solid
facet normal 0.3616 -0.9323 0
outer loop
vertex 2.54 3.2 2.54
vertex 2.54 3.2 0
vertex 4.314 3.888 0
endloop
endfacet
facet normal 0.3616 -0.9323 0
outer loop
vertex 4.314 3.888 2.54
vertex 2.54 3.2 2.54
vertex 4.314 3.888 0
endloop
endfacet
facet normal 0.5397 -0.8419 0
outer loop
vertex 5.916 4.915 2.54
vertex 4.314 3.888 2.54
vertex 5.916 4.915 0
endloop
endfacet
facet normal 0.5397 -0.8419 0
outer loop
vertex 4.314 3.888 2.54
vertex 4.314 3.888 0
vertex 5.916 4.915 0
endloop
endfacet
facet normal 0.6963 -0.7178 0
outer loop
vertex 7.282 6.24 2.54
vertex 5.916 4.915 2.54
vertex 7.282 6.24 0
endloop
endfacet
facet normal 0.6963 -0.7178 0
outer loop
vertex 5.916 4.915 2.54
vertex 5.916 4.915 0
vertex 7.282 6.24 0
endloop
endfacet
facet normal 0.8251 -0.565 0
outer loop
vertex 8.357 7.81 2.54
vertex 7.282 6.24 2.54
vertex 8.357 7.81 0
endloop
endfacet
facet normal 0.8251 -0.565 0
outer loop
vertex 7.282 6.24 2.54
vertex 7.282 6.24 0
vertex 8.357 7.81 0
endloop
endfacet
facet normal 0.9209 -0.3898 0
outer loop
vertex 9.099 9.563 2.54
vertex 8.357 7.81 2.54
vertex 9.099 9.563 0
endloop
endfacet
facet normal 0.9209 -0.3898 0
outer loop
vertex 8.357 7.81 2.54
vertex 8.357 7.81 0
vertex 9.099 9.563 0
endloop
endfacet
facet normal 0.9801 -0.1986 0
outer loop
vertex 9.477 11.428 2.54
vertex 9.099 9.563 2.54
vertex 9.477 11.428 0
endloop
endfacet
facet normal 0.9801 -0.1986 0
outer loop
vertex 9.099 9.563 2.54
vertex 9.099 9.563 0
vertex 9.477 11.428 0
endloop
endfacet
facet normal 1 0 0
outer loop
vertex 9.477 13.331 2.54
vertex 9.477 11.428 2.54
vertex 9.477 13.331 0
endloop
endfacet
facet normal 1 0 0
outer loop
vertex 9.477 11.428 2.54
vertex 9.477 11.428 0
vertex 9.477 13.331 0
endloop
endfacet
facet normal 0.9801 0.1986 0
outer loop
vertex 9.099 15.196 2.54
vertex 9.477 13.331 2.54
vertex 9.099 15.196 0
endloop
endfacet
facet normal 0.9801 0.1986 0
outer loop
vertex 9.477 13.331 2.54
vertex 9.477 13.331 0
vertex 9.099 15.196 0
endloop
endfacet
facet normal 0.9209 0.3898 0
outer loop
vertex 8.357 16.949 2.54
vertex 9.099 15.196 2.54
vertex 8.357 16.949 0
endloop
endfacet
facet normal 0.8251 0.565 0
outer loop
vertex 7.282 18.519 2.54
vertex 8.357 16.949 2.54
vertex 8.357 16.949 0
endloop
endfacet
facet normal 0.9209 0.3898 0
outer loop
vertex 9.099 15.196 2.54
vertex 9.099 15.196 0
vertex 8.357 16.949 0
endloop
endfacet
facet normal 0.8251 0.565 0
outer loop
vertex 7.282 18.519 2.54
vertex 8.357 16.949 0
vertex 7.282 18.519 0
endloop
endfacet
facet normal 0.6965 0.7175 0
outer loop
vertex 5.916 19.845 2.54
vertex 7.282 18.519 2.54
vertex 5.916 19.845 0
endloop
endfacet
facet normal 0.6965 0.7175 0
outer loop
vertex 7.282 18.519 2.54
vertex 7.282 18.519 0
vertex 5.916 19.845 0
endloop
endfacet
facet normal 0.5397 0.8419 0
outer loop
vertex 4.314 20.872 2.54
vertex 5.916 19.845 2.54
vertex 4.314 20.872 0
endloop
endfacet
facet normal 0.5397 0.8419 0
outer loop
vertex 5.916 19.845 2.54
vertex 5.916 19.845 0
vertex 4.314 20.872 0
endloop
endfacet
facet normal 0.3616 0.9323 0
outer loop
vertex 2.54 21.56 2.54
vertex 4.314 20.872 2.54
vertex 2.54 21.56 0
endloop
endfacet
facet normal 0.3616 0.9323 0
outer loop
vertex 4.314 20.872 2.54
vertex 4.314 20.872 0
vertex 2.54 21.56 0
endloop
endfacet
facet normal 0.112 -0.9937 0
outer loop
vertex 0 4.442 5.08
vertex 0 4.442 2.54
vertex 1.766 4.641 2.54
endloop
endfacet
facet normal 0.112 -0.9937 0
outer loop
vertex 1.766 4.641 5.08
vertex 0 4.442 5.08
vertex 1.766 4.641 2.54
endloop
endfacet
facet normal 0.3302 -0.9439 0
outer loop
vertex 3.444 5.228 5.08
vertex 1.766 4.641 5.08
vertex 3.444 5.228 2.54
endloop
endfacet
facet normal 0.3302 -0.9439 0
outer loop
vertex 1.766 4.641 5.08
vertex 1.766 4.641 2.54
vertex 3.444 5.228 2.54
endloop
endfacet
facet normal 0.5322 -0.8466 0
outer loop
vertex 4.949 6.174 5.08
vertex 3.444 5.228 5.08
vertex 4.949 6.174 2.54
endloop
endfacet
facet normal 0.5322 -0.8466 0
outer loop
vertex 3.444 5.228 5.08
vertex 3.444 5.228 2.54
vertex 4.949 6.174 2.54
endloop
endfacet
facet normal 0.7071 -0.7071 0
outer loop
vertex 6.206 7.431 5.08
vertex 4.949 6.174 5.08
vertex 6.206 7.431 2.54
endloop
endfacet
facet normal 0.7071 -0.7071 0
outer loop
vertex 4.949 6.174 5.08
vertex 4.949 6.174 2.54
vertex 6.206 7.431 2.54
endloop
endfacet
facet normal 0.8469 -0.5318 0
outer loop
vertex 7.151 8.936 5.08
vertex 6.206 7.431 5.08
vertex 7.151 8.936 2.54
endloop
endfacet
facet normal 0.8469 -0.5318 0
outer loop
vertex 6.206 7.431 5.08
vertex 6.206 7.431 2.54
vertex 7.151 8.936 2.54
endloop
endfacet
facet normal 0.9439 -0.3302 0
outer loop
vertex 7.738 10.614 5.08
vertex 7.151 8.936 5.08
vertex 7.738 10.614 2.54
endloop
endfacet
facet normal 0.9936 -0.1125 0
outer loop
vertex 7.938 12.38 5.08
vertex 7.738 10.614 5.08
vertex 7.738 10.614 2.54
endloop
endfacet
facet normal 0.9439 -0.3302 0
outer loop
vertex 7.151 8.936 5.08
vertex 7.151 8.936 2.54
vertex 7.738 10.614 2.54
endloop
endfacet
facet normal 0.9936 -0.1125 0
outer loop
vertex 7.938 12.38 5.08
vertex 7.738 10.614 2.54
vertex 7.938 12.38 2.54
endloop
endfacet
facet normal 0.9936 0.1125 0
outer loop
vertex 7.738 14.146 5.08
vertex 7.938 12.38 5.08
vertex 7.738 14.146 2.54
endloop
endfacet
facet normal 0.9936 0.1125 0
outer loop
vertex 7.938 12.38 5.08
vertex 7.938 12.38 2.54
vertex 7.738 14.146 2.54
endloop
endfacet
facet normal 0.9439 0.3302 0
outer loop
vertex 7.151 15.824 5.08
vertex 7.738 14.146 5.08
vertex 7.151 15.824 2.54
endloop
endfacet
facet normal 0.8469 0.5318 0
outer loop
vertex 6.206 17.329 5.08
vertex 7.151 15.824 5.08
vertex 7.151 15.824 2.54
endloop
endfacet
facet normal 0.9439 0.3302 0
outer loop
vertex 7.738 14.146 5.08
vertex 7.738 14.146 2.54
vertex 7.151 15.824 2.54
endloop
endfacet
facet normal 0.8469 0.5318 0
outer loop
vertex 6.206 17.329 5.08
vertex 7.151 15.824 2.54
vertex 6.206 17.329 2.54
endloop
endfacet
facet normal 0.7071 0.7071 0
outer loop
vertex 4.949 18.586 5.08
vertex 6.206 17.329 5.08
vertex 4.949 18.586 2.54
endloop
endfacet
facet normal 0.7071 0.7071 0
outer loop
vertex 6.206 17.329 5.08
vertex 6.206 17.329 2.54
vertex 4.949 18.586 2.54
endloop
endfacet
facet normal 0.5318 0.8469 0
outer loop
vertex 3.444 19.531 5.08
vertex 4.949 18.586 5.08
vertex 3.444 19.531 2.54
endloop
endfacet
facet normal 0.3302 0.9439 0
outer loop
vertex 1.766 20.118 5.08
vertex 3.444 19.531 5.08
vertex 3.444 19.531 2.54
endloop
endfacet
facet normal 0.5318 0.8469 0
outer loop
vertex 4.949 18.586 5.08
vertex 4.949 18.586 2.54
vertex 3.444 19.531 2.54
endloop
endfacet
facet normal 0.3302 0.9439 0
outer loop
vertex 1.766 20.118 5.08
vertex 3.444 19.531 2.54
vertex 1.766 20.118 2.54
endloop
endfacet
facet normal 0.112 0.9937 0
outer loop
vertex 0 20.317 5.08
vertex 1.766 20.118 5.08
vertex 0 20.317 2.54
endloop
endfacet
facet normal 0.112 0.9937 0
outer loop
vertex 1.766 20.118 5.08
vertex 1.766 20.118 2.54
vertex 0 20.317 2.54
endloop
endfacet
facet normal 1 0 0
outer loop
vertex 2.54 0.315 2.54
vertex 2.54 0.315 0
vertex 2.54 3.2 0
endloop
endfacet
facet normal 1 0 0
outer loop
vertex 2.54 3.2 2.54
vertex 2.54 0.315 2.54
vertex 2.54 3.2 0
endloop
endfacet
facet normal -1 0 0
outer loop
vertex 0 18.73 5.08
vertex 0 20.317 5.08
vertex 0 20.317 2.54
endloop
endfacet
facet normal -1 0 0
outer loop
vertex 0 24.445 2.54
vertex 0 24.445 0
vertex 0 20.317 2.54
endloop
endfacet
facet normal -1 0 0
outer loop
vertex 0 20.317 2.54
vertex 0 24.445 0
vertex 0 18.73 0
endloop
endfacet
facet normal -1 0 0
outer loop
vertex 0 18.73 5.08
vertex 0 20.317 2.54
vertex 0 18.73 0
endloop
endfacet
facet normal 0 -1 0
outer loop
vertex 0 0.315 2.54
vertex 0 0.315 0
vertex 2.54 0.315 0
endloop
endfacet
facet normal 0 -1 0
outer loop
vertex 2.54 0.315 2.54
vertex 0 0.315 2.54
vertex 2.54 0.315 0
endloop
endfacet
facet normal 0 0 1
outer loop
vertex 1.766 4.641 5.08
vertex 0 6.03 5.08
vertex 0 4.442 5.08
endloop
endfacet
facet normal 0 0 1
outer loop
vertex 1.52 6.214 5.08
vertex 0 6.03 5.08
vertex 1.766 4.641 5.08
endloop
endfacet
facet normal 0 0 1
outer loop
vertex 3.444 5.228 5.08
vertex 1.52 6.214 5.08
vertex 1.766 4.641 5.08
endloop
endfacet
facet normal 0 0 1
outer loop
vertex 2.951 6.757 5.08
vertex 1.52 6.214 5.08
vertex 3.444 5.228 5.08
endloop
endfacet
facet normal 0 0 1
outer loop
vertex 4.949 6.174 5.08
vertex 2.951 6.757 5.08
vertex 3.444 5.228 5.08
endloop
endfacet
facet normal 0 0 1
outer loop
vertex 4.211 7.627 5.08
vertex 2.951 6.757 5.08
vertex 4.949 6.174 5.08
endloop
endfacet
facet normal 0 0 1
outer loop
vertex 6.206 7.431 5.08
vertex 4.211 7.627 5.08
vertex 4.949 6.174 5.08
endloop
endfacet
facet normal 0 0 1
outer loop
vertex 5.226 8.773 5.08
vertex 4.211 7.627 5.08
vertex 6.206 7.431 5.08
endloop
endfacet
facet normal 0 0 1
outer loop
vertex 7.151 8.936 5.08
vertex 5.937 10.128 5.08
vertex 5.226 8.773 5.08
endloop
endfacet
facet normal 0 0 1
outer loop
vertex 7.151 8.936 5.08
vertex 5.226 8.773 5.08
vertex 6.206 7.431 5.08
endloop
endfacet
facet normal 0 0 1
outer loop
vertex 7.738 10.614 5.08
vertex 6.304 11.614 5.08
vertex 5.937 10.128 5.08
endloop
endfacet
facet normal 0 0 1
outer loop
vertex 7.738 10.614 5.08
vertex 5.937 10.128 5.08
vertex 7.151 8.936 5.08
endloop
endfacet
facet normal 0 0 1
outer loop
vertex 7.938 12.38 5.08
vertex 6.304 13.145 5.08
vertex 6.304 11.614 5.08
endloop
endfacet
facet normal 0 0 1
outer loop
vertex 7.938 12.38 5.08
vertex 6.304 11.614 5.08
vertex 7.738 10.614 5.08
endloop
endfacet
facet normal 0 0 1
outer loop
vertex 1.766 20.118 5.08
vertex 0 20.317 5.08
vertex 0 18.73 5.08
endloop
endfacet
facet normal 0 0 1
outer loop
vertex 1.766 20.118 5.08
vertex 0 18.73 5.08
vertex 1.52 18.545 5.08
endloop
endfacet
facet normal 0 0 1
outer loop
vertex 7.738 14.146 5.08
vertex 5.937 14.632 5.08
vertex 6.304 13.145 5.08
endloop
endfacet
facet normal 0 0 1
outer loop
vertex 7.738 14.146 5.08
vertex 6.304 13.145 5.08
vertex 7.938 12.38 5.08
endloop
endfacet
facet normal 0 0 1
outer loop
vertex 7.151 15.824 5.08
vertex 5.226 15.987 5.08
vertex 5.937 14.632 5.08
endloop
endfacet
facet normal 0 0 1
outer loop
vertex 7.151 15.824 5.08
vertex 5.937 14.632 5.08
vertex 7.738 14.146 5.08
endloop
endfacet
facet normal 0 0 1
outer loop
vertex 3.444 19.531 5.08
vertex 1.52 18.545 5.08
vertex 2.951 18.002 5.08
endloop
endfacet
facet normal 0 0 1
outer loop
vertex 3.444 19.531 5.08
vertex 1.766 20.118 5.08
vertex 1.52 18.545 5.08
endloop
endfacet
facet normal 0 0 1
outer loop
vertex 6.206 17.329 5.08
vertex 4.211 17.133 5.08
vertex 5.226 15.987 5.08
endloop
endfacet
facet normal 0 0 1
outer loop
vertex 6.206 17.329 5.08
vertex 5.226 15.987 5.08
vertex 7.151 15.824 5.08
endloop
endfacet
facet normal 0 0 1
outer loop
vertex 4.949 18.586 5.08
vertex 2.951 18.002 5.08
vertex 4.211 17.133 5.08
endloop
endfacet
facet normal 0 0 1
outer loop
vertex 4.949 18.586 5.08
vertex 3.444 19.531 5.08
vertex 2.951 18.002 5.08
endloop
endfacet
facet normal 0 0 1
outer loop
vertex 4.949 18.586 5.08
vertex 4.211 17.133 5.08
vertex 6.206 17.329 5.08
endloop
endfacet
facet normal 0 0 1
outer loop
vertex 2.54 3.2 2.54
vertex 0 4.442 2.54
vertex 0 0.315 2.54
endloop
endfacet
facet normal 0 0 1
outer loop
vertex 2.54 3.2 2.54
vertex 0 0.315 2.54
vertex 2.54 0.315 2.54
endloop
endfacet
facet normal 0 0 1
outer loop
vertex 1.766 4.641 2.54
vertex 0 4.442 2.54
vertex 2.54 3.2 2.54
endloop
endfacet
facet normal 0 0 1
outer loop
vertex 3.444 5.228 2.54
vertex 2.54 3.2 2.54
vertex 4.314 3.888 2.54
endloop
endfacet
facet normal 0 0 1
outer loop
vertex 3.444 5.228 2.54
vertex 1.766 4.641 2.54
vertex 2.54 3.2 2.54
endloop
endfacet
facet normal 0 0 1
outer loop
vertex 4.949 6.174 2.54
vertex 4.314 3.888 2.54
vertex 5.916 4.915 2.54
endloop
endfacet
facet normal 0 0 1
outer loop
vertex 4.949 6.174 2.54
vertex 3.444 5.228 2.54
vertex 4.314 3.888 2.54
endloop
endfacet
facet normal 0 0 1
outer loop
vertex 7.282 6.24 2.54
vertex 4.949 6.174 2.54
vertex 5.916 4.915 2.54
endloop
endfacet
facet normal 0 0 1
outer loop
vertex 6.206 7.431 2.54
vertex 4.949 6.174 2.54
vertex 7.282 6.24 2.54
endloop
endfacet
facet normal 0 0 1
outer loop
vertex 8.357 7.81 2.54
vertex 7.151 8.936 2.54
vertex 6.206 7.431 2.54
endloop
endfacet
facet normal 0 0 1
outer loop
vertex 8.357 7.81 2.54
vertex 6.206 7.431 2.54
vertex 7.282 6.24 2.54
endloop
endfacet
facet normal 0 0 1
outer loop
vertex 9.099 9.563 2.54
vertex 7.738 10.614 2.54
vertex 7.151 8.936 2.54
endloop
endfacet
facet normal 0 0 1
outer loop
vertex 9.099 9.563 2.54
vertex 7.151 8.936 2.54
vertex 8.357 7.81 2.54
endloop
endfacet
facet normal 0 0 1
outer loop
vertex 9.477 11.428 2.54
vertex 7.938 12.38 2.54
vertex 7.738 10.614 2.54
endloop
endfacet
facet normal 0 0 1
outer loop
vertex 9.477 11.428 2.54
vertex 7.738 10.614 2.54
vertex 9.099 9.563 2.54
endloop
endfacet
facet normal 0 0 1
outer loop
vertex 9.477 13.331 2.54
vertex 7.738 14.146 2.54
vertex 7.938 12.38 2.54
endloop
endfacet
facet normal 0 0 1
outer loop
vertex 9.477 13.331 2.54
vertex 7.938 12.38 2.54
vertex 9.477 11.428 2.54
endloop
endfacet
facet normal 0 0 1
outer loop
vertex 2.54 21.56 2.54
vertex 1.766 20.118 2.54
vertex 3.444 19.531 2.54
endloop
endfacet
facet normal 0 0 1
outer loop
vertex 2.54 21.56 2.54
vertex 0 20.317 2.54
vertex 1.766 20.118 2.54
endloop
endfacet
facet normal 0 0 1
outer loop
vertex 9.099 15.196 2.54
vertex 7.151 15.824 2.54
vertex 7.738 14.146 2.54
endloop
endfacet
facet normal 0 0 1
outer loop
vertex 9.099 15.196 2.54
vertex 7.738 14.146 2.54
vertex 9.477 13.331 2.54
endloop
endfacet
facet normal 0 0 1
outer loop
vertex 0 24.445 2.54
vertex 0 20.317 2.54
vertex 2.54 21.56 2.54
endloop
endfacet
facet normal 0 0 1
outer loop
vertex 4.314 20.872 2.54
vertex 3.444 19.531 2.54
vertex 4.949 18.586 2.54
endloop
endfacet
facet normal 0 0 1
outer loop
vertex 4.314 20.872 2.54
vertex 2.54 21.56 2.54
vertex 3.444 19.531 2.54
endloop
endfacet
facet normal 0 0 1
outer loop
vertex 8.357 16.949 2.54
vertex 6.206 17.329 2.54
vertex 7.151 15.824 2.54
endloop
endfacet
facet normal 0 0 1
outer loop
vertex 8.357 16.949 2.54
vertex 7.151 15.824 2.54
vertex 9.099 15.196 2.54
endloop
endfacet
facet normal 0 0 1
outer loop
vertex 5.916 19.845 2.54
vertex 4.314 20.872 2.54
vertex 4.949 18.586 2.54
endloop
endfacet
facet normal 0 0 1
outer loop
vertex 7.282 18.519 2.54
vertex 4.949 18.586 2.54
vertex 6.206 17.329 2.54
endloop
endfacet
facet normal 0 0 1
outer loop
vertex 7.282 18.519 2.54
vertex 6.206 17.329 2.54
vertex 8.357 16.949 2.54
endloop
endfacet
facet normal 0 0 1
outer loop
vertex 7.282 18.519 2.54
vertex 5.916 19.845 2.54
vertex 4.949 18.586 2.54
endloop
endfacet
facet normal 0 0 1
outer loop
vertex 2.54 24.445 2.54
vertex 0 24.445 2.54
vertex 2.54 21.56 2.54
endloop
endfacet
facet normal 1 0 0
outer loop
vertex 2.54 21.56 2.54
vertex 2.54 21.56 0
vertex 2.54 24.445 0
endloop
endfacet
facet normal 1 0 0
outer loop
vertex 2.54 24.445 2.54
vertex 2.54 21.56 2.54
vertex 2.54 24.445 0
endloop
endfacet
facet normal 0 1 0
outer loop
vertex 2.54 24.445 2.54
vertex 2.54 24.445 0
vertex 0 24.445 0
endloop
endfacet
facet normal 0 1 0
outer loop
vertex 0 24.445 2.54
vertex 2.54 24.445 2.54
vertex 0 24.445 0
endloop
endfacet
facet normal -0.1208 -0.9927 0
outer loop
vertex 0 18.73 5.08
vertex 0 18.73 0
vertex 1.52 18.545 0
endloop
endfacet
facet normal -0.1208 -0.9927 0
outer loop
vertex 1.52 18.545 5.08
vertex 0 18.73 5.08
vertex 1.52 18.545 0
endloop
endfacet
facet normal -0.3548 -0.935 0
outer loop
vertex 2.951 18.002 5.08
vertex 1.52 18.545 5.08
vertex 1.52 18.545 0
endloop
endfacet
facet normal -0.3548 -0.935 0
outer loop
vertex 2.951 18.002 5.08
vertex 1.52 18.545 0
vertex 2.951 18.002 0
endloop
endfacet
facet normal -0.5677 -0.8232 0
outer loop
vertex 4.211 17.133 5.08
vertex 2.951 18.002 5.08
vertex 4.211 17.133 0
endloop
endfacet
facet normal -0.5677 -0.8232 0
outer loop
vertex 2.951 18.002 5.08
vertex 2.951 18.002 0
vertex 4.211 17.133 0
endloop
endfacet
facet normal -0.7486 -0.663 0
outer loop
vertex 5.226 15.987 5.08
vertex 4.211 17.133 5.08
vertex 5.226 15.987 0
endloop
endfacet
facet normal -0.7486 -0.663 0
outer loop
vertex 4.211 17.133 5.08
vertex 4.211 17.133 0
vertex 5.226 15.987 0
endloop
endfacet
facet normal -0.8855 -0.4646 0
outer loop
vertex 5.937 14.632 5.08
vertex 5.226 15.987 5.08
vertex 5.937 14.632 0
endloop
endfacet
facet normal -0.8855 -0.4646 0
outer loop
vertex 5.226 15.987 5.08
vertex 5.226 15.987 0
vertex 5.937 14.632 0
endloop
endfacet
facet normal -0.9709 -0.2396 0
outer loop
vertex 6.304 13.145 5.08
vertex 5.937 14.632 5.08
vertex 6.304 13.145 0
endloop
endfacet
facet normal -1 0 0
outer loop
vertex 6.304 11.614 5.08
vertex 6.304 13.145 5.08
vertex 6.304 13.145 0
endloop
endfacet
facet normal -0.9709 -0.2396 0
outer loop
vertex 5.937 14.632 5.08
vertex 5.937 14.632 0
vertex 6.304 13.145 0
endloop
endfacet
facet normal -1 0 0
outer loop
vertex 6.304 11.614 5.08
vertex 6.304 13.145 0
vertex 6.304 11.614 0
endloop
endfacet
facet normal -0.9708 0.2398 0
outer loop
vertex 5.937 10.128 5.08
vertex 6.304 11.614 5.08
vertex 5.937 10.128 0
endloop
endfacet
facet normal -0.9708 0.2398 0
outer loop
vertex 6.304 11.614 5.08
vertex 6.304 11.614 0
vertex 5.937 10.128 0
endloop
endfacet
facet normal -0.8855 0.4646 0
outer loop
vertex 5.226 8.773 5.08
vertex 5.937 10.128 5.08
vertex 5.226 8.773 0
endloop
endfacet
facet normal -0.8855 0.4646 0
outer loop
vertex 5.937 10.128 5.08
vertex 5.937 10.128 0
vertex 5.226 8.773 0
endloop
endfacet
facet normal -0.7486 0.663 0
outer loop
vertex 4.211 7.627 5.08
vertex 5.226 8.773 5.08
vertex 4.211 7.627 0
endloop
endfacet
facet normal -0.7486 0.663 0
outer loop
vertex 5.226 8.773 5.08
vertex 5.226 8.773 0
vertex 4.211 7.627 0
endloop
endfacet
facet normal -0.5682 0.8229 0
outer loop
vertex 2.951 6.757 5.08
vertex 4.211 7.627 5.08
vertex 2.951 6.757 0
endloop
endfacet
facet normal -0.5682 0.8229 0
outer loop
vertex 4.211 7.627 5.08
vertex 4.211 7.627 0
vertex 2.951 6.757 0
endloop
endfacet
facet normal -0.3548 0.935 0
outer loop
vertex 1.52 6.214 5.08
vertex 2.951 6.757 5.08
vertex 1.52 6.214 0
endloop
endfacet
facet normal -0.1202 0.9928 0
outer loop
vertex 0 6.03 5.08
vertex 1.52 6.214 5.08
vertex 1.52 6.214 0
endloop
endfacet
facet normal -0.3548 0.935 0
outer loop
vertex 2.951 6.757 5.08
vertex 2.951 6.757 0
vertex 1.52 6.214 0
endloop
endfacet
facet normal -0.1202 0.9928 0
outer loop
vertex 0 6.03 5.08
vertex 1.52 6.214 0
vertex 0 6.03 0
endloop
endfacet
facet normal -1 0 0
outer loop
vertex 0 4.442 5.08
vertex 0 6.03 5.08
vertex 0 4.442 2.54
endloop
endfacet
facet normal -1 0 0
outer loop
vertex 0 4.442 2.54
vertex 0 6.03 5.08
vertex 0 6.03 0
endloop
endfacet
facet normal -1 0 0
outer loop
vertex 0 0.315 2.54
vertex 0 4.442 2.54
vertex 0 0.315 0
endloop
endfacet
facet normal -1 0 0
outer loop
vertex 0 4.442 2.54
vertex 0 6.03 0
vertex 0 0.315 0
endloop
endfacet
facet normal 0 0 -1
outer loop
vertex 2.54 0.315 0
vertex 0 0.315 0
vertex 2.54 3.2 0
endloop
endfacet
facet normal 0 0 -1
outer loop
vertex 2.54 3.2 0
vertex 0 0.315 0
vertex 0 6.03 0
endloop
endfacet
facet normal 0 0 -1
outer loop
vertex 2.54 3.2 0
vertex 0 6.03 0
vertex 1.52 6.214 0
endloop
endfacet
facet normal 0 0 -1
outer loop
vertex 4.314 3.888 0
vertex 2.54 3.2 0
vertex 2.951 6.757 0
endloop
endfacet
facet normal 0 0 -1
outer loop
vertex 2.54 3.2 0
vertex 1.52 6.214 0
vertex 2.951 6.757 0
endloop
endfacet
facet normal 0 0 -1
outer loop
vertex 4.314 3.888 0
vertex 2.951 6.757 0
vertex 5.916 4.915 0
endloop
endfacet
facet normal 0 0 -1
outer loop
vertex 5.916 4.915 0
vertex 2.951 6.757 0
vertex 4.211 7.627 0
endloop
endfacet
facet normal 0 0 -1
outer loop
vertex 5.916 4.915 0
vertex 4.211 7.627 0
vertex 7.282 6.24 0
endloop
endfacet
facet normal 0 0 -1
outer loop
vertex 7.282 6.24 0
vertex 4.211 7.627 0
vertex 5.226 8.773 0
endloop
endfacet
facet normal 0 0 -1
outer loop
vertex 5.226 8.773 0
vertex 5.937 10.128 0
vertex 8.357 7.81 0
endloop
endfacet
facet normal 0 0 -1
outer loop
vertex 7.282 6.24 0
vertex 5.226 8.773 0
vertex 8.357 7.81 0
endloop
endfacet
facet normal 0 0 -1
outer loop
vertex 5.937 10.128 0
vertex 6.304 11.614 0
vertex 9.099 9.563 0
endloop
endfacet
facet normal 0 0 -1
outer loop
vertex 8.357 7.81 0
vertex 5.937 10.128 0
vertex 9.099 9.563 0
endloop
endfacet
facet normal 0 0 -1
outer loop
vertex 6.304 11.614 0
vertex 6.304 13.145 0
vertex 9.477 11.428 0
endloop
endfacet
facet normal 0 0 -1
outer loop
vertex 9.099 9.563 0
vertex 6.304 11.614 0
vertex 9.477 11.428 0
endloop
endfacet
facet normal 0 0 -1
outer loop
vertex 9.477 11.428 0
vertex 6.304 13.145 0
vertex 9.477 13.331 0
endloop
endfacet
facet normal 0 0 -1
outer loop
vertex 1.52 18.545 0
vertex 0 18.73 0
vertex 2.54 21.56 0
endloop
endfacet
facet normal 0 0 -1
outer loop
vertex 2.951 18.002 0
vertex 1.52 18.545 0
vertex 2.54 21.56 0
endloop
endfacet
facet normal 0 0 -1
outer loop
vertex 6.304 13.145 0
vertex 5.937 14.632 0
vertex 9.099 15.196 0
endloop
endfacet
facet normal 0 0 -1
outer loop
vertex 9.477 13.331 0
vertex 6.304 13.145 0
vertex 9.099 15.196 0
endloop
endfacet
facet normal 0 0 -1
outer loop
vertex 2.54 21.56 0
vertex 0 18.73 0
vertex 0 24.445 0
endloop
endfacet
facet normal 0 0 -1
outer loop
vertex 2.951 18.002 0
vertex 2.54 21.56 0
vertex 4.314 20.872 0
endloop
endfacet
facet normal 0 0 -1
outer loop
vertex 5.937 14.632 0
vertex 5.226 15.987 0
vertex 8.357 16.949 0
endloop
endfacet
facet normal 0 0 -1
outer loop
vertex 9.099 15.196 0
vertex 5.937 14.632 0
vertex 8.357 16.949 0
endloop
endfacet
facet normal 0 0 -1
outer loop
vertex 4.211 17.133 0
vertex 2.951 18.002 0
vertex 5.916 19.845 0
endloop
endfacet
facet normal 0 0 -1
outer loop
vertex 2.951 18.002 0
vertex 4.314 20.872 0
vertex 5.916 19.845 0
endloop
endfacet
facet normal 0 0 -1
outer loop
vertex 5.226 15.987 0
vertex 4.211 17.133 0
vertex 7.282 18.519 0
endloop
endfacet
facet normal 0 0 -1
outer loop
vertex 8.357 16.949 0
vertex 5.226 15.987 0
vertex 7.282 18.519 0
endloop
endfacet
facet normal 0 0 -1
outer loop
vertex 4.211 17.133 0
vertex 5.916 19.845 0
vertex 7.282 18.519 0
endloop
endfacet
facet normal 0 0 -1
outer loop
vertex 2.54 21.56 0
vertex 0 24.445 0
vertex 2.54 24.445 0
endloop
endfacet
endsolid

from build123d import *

# Parameters (mm, degrees)
F1_DEPTH = 2.54
F3_DEPTH = 2.54


with BuildPart() as f1:
    # F0 (on Top) → F1 (new body)
    with BuildSketch(Plane.XY):
        with BuildLine():
            Line((0, 6.029797), (0, 2.854797))
            ThreePointArc((0, 2.854797), (1.281656, 2.941419), (2.54, 3.199709))
            ThreePointArc((2.54, 3.199709), (9.525, 12.379797), (2.54, 21.559886))
            ThreePointArc((2.54, 21.559886), (1.281656, 21.818175), (0, 21.904797))
            Line((0, 21.904797), (0, 18.729797))
            ThreePointArc((0, 18.729797), (6.35, 12.379797), (0, 6.029797))
        make_face()
        with BuildLine():
            ThreePointArc((2.54, 3.199709), (1.281656, 2.941419), (0, 2.854797))
            Line((0, 2.854797), (0, 0.314797))
            Line((0, 0.314797), (2.54, 0.314797))
            Line((2.54, 0.314797), (2.54, 3.199709))
        make_face()
        with BuildLine():
            ThreePointArc((0, 21.904797), (1.281656, 21.818175), (2.54, 21.559886))
            Line((2.54, 21.559886), (2.54, 24.444797))
            Line((2.54, 24.444797), (0, 24.444797))
            Line((0, 24.444797), (0, 21.904797))
        make_face()
    extrude(amount=F1_DEPTH)

    # F2 (on face) → F3 (join)
    with BuildSketch(Plane.XY.offset(2.54)):
        with BuildLine():
            Line((0, 6.029797), (0, 4.442297))
            ThreePointArc((0, 4.442297), (7.9375, 12.379797), (0, 20.317297))
            Line((0, 20.317297), (0, 18.729797))
            ThreePointArc((0, 18.729797), (6.35, 12.379797), (0, 6.029797))
        make_face()
    extrude(amount=F3_DEPTH)


solid = f1.part
